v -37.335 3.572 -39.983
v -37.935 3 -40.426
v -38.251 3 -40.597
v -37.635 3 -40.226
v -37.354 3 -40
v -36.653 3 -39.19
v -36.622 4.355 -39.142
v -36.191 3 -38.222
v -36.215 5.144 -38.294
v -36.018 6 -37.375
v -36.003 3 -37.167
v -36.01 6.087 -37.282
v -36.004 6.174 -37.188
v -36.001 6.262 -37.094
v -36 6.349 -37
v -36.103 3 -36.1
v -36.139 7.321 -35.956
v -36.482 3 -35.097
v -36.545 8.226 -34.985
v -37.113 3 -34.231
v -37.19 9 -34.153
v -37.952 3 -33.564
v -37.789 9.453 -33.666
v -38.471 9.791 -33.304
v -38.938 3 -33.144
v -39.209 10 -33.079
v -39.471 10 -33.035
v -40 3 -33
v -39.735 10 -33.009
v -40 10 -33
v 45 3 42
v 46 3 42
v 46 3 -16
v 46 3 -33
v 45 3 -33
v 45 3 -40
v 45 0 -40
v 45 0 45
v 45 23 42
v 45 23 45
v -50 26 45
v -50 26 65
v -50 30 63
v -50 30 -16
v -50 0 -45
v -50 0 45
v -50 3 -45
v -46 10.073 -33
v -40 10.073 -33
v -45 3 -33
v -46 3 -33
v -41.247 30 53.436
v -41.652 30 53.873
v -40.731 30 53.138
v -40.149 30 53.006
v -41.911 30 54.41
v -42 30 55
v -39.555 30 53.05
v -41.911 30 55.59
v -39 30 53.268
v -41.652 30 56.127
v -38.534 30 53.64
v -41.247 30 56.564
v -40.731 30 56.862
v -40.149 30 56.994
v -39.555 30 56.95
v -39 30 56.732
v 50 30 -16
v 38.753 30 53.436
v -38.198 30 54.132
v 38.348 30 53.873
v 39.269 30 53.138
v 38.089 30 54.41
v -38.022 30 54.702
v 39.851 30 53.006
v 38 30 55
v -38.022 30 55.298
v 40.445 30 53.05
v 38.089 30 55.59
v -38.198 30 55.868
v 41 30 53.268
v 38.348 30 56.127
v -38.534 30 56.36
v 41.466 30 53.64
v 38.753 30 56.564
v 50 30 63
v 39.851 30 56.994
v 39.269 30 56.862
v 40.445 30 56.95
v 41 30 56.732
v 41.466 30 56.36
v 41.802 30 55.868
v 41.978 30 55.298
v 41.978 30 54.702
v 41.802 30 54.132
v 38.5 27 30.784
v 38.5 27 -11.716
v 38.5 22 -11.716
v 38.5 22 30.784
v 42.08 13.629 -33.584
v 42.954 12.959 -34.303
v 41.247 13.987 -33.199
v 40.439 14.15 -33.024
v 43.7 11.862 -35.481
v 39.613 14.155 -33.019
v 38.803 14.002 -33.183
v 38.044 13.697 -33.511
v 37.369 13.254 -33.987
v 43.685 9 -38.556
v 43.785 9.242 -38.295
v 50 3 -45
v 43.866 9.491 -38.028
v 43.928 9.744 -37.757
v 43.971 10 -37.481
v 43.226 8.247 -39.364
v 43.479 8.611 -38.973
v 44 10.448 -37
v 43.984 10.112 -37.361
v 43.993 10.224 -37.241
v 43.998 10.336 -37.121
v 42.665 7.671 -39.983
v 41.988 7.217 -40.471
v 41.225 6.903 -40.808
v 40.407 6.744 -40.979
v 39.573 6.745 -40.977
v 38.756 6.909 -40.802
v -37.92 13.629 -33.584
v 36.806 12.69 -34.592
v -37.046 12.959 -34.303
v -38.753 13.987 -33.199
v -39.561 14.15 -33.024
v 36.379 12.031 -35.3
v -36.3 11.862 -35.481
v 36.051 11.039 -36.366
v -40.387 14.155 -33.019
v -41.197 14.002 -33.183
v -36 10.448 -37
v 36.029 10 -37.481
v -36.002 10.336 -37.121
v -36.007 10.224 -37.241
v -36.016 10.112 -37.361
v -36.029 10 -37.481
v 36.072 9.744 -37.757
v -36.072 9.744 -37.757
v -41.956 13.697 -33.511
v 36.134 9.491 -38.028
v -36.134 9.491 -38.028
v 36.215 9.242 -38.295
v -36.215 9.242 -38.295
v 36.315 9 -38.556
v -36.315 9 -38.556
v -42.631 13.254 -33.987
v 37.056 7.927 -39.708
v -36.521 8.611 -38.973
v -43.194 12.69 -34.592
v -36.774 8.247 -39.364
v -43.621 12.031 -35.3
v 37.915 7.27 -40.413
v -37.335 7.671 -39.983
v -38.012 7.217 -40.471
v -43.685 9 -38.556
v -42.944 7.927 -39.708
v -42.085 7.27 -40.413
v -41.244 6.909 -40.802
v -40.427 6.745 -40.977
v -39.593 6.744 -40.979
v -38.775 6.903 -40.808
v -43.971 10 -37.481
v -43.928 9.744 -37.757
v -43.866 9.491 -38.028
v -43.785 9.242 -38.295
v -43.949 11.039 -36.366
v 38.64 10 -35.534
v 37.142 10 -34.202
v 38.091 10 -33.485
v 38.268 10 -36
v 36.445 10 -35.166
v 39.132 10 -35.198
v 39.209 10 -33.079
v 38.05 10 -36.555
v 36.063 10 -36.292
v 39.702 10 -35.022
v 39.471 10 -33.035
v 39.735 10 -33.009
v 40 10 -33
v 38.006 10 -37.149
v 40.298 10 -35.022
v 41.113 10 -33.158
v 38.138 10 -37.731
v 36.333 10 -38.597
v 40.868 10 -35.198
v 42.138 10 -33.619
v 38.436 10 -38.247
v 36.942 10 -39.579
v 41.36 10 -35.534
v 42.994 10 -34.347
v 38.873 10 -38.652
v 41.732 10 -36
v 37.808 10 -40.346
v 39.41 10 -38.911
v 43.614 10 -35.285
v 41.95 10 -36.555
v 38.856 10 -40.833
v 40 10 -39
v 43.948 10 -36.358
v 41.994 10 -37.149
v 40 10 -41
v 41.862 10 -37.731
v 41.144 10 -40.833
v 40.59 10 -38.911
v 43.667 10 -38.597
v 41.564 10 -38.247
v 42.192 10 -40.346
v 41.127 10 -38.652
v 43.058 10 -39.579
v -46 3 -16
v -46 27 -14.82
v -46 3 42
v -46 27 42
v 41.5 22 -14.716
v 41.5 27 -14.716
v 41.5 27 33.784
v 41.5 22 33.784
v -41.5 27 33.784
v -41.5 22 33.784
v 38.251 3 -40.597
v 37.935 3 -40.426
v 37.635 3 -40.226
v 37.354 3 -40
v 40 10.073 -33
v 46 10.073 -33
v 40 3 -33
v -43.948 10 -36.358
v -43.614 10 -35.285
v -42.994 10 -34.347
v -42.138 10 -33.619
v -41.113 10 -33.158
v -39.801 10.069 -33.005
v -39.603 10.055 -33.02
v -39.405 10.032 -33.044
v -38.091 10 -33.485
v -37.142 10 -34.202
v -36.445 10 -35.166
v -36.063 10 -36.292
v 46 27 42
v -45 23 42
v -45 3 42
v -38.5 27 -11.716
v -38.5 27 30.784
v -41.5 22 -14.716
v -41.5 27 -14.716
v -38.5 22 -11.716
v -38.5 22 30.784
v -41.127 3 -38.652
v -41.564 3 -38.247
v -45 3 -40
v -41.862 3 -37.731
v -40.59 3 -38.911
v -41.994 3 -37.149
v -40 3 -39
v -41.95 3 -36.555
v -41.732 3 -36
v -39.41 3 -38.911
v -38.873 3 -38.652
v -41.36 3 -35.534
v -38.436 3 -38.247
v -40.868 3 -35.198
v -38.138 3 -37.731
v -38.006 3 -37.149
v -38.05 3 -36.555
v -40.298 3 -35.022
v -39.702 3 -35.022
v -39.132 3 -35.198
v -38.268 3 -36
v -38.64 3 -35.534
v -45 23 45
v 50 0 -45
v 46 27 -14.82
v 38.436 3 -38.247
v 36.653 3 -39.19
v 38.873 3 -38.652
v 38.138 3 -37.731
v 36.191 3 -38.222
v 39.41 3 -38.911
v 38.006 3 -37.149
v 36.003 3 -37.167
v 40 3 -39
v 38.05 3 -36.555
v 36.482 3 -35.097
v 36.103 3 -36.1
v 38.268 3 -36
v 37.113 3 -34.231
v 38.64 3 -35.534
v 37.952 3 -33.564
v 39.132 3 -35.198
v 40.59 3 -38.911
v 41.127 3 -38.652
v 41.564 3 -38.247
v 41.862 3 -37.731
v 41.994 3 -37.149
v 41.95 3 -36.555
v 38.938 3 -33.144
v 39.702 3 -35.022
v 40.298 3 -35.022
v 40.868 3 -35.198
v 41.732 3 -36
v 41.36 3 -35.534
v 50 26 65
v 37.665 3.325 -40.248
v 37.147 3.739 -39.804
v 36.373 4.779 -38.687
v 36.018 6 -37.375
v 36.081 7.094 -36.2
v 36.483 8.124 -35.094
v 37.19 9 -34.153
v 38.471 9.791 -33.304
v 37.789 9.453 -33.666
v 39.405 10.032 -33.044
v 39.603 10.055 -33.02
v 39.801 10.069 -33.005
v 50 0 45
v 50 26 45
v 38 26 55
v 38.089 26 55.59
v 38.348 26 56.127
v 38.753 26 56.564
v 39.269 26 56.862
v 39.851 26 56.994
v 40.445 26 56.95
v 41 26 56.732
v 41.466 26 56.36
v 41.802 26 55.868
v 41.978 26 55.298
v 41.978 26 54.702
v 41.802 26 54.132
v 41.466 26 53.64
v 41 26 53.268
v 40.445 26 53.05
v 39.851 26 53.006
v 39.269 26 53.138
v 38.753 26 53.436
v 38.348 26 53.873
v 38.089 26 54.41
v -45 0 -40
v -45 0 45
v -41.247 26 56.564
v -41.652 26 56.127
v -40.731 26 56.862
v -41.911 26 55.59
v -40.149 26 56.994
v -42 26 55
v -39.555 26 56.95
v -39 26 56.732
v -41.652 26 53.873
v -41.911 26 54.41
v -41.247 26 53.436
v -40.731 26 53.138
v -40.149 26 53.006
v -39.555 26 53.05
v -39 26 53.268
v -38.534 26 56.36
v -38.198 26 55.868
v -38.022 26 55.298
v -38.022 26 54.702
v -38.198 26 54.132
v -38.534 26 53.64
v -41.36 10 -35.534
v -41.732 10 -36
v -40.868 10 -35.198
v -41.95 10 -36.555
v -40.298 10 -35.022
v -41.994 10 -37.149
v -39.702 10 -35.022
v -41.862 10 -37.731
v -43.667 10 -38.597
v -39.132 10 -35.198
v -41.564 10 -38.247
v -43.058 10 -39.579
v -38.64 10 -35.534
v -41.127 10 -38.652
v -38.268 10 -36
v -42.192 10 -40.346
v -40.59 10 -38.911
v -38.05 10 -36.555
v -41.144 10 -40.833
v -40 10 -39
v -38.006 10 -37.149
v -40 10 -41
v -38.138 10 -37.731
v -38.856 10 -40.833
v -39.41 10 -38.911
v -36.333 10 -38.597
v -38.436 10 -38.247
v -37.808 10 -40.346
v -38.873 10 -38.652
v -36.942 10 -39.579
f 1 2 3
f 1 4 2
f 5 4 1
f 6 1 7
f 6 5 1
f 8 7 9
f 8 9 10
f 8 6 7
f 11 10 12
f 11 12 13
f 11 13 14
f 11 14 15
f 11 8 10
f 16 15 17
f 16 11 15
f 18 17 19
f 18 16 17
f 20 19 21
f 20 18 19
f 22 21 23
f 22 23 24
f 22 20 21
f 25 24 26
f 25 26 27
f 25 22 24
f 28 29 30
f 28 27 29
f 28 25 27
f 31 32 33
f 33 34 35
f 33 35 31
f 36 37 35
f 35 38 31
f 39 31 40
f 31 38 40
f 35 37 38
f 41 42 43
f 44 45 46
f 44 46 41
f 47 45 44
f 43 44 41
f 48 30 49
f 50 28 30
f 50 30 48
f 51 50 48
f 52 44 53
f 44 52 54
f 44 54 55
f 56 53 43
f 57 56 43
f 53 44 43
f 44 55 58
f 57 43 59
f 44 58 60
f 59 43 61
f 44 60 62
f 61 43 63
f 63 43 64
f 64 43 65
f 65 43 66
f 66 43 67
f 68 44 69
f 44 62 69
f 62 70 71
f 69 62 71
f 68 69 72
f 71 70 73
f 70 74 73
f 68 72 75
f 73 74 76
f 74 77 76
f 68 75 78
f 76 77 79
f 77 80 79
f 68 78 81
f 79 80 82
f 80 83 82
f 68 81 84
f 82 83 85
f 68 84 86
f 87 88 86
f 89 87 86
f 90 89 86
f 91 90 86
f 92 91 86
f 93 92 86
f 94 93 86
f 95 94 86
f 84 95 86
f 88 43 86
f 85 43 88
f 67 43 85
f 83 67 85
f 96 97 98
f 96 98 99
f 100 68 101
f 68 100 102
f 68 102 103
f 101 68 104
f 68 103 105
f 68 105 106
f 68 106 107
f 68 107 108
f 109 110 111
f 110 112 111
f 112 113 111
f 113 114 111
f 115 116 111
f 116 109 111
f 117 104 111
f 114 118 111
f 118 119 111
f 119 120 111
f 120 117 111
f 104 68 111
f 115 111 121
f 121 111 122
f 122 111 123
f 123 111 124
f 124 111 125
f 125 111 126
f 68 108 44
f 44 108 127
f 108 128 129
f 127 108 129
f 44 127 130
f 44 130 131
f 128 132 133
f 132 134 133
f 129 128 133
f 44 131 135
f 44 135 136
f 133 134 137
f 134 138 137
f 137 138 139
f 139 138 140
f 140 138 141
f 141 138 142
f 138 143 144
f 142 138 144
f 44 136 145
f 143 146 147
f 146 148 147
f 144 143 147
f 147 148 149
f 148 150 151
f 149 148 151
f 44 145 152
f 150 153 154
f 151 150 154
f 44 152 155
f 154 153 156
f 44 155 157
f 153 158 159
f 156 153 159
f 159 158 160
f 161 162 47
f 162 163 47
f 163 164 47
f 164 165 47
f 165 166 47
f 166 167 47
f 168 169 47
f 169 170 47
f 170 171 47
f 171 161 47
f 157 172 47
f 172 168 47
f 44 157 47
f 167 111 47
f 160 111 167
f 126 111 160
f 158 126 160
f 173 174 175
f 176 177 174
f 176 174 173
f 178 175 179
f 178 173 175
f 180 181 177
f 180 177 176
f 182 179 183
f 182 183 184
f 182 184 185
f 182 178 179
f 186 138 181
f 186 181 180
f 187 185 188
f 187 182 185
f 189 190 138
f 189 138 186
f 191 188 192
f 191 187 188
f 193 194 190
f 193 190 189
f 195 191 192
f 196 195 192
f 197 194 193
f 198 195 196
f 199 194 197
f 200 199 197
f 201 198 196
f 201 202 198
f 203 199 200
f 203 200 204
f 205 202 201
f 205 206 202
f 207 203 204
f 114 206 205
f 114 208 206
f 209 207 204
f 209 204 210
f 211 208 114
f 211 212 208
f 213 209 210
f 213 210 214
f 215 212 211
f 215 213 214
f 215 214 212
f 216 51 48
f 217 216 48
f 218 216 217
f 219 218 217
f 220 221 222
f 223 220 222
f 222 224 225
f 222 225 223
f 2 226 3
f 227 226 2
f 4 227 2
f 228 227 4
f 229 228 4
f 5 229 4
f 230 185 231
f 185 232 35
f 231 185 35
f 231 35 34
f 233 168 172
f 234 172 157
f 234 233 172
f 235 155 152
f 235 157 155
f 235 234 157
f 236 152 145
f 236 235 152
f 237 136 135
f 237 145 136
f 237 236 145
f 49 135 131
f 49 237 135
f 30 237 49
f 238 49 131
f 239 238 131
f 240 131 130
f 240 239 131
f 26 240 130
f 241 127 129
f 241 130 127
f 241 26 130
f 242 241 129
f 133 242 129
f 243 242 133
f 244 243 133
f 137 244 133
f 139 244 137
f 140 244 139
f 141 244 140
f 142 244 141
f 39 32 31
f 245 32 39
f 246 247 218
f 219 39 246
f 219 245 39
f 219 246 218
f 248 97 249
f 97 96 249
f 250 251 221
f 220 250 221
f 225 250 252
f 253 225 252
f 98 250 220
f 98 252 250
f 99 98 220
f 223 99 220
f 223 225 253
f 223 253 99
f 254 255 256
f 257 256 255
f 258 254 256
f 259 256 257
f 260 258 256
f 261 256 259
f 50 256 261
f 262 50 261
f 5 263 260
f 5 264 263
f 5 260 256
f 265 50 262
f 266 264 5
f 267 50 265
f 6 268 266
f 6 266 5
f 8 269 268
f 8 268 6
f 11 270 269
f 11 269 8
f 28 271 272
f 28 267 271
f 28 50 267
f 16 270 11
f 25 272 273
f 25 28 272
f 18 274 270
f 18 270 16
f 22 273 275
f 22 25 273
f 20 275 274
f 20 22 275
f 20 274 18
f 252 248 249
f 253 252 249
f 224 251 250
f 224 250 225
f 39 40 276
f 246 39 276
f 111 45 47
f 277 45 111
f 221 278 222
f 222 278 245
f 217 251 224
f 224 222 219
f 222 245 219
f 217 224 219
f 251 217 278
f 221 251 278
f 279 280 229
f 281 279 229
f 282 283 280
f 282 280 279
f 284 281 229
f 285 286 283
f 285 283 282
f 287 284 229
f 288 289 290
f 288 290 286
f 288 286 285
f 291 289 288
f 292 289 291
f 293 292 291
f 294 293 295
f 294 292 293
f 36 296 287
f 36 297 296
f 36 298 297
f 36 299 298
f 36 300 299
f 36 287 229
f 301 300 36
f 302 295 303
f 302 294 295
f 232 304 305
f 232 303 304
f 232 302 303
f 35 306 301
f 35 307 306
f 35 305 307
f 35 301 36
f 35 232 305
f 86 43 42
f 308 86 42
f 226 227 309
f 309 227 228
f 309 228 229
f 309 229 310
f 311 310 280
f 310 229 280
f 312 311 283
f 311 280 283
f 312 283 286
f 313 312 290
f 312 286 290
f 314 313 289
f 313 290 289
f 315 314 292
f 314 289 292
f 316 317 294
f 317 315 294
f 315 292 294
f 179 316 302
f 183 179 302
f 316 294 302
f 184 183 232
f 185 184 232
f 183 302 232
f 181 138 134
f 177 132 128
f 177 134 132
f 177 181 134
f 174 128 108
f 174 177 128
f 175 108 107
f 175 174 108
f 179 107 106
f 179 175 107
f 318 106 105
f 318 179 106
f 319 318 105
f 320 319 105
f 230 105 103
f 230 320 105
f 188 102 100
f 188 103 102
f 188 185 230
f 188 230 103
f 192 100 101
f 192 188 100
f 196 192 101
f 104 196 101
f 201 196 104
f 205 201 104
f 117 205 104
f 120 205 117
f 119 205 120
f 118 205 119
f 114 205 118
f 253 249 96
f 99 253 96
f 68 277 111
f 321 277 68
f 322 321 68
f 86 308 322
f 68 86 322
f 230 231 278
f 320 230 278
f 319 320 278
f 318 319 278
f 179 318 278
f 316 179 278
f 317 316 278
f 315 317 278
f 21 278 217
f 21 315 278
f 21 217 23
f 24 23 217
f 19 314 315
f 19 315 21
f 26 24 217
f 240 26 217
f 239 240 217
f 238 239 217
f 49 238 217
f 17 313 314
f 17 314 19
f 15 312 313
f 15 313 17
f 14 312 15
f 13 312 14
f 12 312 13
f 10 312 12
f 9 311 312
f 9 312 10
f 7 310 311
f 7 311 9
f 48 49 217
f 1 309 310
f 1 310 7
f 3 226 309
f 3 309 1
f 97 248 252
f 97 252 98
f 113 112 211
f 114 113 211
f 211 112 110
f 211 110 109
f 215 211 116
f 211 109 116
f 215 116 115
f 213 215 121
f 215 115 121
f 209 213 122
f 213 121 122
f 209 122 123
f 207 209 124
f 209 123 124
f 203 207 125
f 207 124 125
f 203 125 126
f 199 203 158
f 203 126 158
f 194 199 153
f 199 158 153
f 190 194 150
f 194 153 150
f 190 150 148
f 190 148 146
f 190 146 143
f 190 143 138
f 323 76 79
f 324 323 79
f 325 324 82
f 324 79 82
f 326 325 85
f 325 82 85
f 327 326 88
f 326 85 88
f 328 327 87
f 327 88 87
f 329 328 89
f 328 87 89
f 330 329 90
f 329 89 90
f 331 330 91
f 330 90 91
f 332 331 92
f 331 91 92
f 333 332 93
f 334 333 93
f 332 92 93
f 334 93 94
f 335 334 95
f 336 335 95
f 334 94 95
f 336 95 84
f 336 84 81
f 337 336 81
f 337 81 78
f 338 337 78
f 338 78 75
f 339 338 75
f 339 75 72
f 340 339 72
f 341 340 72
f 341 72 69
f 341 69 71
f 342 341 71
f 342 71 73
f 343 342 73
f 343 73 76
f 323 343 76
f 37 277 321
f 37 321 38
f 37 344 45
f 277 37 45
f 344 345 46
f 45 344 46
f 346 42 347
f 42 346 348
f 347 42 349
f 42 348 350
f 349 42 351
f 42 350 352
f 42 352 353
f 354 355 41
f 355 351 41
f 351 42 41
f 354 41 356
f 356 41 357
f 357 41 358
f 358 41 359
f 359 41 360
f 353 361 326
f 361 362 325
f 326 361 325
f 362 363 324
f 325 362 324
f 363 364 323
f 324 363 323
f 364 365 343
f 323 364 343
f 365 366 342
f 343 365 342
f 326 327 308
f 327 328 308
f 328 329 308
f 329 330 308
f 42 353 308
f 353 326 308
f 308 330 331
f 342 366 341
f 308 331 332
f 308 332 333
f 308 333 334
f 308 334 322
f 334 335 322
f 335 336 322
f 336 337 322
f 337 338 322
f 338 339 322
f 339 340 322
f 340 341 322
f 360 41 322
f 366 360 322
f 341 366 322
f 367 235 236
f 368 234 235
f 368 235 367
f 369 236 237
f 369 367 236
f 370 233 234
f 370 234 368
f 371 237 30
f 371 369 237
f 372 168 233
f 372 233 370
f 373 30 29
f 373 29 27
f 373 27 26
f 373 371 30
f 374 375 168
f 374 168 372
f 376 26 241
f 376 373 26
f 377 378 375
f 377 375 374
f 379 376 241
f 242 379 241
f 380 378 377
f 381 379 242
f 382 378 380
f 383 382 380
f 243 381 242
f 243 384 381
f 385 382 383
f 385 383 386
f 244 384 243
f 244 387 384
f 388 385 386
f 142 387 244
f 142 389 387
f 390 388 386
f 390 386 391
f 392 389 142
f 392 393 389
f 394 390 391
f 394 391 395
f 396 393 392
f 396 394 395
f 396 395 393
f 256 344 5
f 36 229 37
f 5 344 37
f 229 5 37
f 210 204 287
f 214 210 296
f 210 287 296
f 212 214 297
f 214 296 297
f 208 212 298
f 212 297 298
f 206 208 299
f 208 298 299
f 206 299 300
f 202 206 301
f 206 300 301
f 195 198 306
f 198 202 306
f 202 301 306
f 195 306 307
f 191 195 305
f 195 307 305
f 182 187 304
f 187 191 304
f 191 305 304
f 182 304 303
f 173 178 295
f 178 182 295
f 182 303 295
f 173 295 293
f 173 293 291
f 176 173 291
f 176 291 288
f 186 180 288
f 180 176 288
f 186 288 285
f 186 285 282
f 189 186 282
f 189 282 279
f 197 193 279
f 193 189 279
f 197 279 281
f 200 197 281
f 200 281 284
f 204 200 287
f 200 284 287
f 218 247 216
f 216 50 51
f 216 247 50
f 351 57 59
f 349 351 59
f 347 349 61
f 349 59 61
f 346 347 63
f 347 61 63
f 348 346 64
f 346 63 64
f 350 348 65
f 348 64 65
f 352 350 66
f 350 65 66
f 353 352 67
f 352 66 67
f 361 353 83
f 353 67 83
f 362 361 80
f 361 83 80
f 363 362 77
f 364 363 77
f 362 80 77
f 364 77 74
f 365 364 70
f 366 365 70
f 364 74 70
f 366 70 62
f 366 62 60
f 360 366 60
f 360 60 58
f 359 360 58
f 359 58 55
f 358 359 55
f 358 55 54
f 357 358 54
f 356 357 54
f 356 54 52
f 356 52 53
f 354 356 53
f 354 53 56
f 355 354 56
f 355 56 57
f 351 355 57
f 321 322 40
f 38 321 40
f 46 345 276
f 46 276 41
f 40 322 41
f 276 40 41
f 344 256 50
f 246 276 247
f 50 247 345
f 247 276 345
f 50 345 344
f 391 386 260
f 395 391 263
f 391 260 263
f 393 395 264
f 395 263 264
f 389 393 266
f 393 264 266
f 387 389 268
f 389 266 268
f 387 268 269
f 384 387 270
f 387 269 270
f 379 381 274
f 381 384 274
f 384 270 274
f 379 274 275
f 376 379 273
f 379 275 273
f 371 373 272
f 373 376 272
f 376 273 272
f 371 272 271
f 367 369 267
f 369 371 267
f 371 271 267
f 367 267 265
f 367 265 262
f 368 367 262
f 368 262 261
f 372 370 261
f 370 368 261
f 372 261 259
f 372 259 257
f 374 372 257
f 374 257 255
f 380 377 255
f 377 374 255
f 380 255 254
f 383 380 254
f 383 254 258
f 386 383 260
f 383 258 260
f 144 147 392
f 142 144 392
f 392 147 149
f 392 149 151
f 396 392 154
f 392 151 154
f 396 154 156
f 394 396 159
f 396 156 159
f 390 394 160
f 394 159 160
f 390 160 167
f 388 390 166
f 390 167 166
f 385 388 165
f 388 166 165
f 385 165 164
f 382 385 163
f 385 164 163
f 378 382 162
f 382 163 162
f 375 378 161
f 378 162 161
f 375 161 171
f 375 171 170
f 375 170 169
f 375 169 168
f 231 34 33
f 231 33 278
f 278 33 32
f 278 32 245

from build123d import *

# Parameters (mm, degrees)
BOSS_EXTRUDE1_DEPTH      = 3
BOSS_EXTRUDE2_DEPTH      = 3
SKETCH3_W                = 100
SKETCH3_H                = 4
BOSS_EXTRUDE3_DEPTH      = 20
CUT_EXTRUDE1_DEPTH       = 106
BOSS_EXTRUDE4_DEPTH      = 58
SKETCH6_W                = 100
SKETCH6_H                = 39.623225513
BOSS_EXTRUDE5_DEPTH      = 3
BOSS_EXTRUDE6_REACH      = 101.805
SKETCH7_W                = 4
SKETCH7_H                = 22.901045637
SKETCH10_R               = 2
CUT_EXTRUDE3_DEPTH       = 10
BOSS_EXTRUDE8_REACH      = 89.321
SKETCH12_R               = 2
CUT_EXTRUDE4_DEPTH       = 88.321245983
SKETCH13_W               = 90
SKETCH13_H               = 7
CUT_EXTRUDE5_DEPTH       = 3
CUT_EXTRUDE6_START       = -21
SKETCH15_R               = 4
SKETCH15_R_2             = 2
CUT_EXTRUDE6_DEPTH       = 21
BOSS_EXTRUDE9_DEPTH      = 1
BOSS_EXTRUDE9_DEPTH_BACK = 3
SKETCH16_R               = 4
SKETCH16_R_2             = 2
SKETCH17_W               = 83
SKETCH17_H               = 48.5
SKETCH17_W_2             = 77
SKETCH17_H_2             = 42.5
BOSS_EXTRUDE10_DEPTH     = 5


with BuildPart() as part:
    # Sketch1 → Boss-Extrude1 (new body)
    with BuildSketch(Plane(origin=(0, 0, 0), x_dir=(1, 0, 0), z_dir=(0, 1, 0))):
        Polygon((-50, 45), (50, 45), (50, -45), (45, -45), (45, 40), (-45, 40), (-45, -45), (-50, -45), align=None)
    extrude(amount=BOSS_EXTRUDE1_DEPTH)

    # Sketch2 → Boss-Extrude2 (add)
    with BuildSketch(Plane.XY.offset(45)):
        Polygon((-50, 3), (-50, 30), (50, 30), (50, 3), (45, 3), (45, 23), (-45, 23), (-45, 3), align=None)
    extrude(amount=-BOSS_EXTRUDE2_DEPTH)

    # Sketch3 → Boss-Extrude3 (add)
    with BuildSketch(Plane.XY.offset(45)):
        with Locations((0, 28)):
            Rectangle(SKETCH3_W, SKETCH3_H)
    extrude(amount=BOSS_EXTRUDE3_DEPTH)

    # Sketch4 → Cut-Extrude1 (cut)
    with BuildSketch(Plane(origin=(50, 0, 0), x_dir=(0, 0, -1), z_dir=(1, 0, 0))):
        Polygon((-65, 26), (-65, 30), (-63, 30), align=None)
    extrude(amount=-CUT_EXTRUDE1_DEPTH, mode=Mode.SUBTRACT)

    # Sketch5 → Boss-Extrude4 (add)
    with BuildSketch(Plane(origin=(0, 0, 42), x_dir=(-1, 0, 0), z_dir=(0, 0, -1))):
        Polygon((-50, 3), (-46, 3), (-46, 27), (46, 27), (46, 3), (50, 3), (50, 30), (-50, 30), align=None)
    extrude(amount=BOSS_EXTRUDE4_DEPTH)

    # Sketch6 → Boss-Extrude5 (add)
    with BuildSketch(Plane(origin=(0, 24.049681529, -22.391082803), x_dir=(-1, 0, 0), z_dir=(0, -0.7318939744313501, 0.6814185279188426))):
        with Locations((0, 11.07936051)):
            Rectangle(SKETCH6_W, SKETCH6_H)
    extrude(amount=BOSS_EXTRUDE5_DEPTH)

    # Sketch7 → Boss-Extrude6 (add, up to next)
    with BuildSketch(Plane(origin=(0, 0, -16), x_dir=(-1, 0, 0), z_dir=(0, 0, -1)), mode=Mode.PRIVATE) as boss_extrude6_sk1:
        with Locations((-48, 14.450522819)):
            Rectangle(SKETCH7_W, SKETCH7_H)
    boss_extrude6_tool1 = extrude(boss_extrude6_sk1.sketch, amount=BOSS_EXTRUDE6_REACH, mode=Mode.PRIVATE) - part.part
    # Sketch7 → Boss-Extrude6 (add, up to next)
    with BuildSketch(Plane(origin=(0, 0, -16), x_dir=(-1, 0, 0), z_dir=(0, 0, -1)), mode=Mode.PRIVATE) as boss_extrude6_sk2:
        with Locations((48, 14.450522819)):
            Rectangle(SKETCH7_W, SKETCH7_H)
    boss_extrude6_tool2 = extrude(boss_extrude6_sk2.sketch, amount=BOSS_EXTRUDE6_REACH, mode=Mode.PRIVATE) - part.part
    add(boss_extrude6_tool1.solids().sort_by_distance((48, 14.450523, -16))[0])
    add(boss_extrude6_tool2.solids().sort_by_distance((-48, 14.450523, -16))[0])

    # Sketch10 → Cut-Extrude3 (cut)
    with BuildSketch(Plane(origin=(0, 30, 0), x_dir=(1, 0, 0), z_dir=(0, 1, 0))):
        with Locations(Location((40, -55, 0), (0, 0, 180))):
            Circle(SKETCH10_R)
        with Locations(Location((-40, -55, 0), (0, 0, 180))):
            Circle(SKETCH10_R)
    extrude(amount=-CUT_EXTRUDE3_DEPTH, mode=Mode.SUBTRACT)

    # Boss-Extrude8: up to this plane
    boss_extrude8_end = Plane(origin=(0, 21.853999605, -20.346827219), z_dir=(0, -0.7318939744313501, 0.6814185279188426))
    # Sketch11 → Boss-Extrude8 (add, up to the surface)
    with BuildSketch(Plane.XZ, mode=Mode.PRIVATE) as boss_extrude8_sk1:
        with BuildLine():
            Line((-40, -33), (-48.829023615, -33))
            Line((-48.829023615, -33), (-48.829023615, -41))
            Line((-48.829023615, -41), (-40, -41))
            ThreePointArc((-40, -41), (-36, -37), (-40, -33))
        make_face()
    boss_extrude8_tool1 = split(extrude(boss_extrude8_sk1.sketch, amount=-BOSS_EXTRUDE8_REACH, mode=Mode.PRIVATE), bisect_by=boss_extrude8_end, keep=Keep.BOTH, mode=Mode.PRIVATE)
    add(boss_extrude8_tool1.solids().sort_by_distance((-42.810423, 0, -37))[0])
    # Sketch11 → Boss-Extrude8 (add, up to the surface)
    with BuildSketch(Plane.XZ, mode=Mode.PRIVATE) as boss_extrude8_sk2:
        with BuildLine():
            Line((40, -33), (48.614584002, -33))
            Line((48.614584002, -33), (48.614584002, -41))
            Line((48.614584002, -41), (40, -41))
            ThreePointArc((40, -41), (36, -37), (40, -33))
        make_face()
    boss_extrude8_tool2 = split(extrude(boss_extrude8_sk2.sketch, amount=-BOSS_EXTRUDE8_REACH, mode=Mode.PRIVATE), bisect_by=boss_extrude8_end, keep=Keep.BOTH, mode=Mode.PRIVATE)
    add(boss_extrude8_tool2.solids().sort_by_distance((42.702596, 0, -37))[0])

    # Sketch12 → Cut-Extrude4 (cut, through all)
    with BuildSketch(Plane.XZ):
        with Locations(Location((-40, -37, 0), (0, 0, 270))):
            Circle(SKETCH12_R)
        with Locations(Location((40, -37, 0), (0, 0, 270))):
            Circle(SKETCH12_R)
    extrude(amount=-CUT_EXTRUDE4_DEPTH, mode=Mode.SUBTRACT)

    # Sketch13 → Cut-Extrude5 (cut)
    with BuildSketch(Plane.XZ):
        with Locations((0, -36.5)):
            Rectangle(SKETCH13_W, SKETCH13_H)
    extrude(amount=-CUT_EXTRUDE5_DEPTH, mode=Mode.SUBTRACT)

    # Sketch15 → Cut-Extrude6 (cut)
    # profile 1 of 2: a face of its own
    with BuildSketch(Plane(origin=(0, 30, 0), x_dir=(1, 0, 0), z_dir=(0, 1, 0)).offset(CUT_EXTRUDE6_START)):
        with Locations((-40, 37)):
            Circle(SKETCH15_R)
        with Locations(Location((-40, 37, 0), (0, 0, 90))):
            Circle(SKETCH15_R_2, mode=Mode.SUBTRACT)
    # profile 2 of 2: a face of its own
    with BuildSketch(Plane(origin=(0, 30, 0), x_dir=(1, 0, 0), z_dir=(0, 1, 0)).offset(CUT_EXTRUDE6_START)):
        with Locations((40, 37)):
            Circle(SKETCH15_R)
        with Locations(Location((40, 37, 0), (0, 0, 90))):
            Circle(SKETCH15_R_2, mode=Mode.SUBTRACT)
    extrude(amount=CUT_EXTRUDE6_DEPTH, mode=Mode.SUBTRACT)

    # Sketch16 → Boss-Extrude9 (add, two sides: drawn at the far end of the back side and taken through both)
    # profile 1 of 2: a face of its own
    with BuildSketch(Plane(origin=(0, 9, 0), x_dir=(1, 0, 0), z_dir=(0, 1, 0)).offset(-BOSS_EXTRUDE9_DEPTH_BACK)):
        with Locations((-40, 37)):
            Circle(SKETCH16_R)
        with Locations(Location((-40, 37, 0), (0, 0, 90))):
            Circle(SKETCH16_R_2, mode=Mode.SUBTRACT)
    # profile 2 of 2: a face of its own
    with BuildSketch(Plane(origin=(0, 9, 0), x_dir=(1, 0, 0), z_dir=(0, 1, 0)).offset(-BOSS_EXTRUDE9_DEPTH_BACK)):
        with Locations((40, 37)):
            Circle(SKETCH16_R)
        with Locations(Location((40, 37, 0), (0, 0, 90))):
            Circle(SKETCH16_R_2, mode=Mode.SUBTRACT)
    extrude(amount=BOSS_EXTRUDE9_DEPTH + BOSS_EXTRUDE9_DEPTH_BACK)

    # Sketch17 → Boss-Extrude10 (add)
    with BuildSketch(Plane.XZ.offset(-27)):
        with Locations((0, 9.534179837)):
            Rectangle(SKETCH17_W, SKETCH17_H)
        with Locations((0, 9.534179837)):
            Rectangle(SKETCH17_W_2, SKETCH17_H_2, mode=Mode.SUBTRACT)
    extrude(amount=BOSS_EXTRUDE10_DEPTH)


solid = part.part
